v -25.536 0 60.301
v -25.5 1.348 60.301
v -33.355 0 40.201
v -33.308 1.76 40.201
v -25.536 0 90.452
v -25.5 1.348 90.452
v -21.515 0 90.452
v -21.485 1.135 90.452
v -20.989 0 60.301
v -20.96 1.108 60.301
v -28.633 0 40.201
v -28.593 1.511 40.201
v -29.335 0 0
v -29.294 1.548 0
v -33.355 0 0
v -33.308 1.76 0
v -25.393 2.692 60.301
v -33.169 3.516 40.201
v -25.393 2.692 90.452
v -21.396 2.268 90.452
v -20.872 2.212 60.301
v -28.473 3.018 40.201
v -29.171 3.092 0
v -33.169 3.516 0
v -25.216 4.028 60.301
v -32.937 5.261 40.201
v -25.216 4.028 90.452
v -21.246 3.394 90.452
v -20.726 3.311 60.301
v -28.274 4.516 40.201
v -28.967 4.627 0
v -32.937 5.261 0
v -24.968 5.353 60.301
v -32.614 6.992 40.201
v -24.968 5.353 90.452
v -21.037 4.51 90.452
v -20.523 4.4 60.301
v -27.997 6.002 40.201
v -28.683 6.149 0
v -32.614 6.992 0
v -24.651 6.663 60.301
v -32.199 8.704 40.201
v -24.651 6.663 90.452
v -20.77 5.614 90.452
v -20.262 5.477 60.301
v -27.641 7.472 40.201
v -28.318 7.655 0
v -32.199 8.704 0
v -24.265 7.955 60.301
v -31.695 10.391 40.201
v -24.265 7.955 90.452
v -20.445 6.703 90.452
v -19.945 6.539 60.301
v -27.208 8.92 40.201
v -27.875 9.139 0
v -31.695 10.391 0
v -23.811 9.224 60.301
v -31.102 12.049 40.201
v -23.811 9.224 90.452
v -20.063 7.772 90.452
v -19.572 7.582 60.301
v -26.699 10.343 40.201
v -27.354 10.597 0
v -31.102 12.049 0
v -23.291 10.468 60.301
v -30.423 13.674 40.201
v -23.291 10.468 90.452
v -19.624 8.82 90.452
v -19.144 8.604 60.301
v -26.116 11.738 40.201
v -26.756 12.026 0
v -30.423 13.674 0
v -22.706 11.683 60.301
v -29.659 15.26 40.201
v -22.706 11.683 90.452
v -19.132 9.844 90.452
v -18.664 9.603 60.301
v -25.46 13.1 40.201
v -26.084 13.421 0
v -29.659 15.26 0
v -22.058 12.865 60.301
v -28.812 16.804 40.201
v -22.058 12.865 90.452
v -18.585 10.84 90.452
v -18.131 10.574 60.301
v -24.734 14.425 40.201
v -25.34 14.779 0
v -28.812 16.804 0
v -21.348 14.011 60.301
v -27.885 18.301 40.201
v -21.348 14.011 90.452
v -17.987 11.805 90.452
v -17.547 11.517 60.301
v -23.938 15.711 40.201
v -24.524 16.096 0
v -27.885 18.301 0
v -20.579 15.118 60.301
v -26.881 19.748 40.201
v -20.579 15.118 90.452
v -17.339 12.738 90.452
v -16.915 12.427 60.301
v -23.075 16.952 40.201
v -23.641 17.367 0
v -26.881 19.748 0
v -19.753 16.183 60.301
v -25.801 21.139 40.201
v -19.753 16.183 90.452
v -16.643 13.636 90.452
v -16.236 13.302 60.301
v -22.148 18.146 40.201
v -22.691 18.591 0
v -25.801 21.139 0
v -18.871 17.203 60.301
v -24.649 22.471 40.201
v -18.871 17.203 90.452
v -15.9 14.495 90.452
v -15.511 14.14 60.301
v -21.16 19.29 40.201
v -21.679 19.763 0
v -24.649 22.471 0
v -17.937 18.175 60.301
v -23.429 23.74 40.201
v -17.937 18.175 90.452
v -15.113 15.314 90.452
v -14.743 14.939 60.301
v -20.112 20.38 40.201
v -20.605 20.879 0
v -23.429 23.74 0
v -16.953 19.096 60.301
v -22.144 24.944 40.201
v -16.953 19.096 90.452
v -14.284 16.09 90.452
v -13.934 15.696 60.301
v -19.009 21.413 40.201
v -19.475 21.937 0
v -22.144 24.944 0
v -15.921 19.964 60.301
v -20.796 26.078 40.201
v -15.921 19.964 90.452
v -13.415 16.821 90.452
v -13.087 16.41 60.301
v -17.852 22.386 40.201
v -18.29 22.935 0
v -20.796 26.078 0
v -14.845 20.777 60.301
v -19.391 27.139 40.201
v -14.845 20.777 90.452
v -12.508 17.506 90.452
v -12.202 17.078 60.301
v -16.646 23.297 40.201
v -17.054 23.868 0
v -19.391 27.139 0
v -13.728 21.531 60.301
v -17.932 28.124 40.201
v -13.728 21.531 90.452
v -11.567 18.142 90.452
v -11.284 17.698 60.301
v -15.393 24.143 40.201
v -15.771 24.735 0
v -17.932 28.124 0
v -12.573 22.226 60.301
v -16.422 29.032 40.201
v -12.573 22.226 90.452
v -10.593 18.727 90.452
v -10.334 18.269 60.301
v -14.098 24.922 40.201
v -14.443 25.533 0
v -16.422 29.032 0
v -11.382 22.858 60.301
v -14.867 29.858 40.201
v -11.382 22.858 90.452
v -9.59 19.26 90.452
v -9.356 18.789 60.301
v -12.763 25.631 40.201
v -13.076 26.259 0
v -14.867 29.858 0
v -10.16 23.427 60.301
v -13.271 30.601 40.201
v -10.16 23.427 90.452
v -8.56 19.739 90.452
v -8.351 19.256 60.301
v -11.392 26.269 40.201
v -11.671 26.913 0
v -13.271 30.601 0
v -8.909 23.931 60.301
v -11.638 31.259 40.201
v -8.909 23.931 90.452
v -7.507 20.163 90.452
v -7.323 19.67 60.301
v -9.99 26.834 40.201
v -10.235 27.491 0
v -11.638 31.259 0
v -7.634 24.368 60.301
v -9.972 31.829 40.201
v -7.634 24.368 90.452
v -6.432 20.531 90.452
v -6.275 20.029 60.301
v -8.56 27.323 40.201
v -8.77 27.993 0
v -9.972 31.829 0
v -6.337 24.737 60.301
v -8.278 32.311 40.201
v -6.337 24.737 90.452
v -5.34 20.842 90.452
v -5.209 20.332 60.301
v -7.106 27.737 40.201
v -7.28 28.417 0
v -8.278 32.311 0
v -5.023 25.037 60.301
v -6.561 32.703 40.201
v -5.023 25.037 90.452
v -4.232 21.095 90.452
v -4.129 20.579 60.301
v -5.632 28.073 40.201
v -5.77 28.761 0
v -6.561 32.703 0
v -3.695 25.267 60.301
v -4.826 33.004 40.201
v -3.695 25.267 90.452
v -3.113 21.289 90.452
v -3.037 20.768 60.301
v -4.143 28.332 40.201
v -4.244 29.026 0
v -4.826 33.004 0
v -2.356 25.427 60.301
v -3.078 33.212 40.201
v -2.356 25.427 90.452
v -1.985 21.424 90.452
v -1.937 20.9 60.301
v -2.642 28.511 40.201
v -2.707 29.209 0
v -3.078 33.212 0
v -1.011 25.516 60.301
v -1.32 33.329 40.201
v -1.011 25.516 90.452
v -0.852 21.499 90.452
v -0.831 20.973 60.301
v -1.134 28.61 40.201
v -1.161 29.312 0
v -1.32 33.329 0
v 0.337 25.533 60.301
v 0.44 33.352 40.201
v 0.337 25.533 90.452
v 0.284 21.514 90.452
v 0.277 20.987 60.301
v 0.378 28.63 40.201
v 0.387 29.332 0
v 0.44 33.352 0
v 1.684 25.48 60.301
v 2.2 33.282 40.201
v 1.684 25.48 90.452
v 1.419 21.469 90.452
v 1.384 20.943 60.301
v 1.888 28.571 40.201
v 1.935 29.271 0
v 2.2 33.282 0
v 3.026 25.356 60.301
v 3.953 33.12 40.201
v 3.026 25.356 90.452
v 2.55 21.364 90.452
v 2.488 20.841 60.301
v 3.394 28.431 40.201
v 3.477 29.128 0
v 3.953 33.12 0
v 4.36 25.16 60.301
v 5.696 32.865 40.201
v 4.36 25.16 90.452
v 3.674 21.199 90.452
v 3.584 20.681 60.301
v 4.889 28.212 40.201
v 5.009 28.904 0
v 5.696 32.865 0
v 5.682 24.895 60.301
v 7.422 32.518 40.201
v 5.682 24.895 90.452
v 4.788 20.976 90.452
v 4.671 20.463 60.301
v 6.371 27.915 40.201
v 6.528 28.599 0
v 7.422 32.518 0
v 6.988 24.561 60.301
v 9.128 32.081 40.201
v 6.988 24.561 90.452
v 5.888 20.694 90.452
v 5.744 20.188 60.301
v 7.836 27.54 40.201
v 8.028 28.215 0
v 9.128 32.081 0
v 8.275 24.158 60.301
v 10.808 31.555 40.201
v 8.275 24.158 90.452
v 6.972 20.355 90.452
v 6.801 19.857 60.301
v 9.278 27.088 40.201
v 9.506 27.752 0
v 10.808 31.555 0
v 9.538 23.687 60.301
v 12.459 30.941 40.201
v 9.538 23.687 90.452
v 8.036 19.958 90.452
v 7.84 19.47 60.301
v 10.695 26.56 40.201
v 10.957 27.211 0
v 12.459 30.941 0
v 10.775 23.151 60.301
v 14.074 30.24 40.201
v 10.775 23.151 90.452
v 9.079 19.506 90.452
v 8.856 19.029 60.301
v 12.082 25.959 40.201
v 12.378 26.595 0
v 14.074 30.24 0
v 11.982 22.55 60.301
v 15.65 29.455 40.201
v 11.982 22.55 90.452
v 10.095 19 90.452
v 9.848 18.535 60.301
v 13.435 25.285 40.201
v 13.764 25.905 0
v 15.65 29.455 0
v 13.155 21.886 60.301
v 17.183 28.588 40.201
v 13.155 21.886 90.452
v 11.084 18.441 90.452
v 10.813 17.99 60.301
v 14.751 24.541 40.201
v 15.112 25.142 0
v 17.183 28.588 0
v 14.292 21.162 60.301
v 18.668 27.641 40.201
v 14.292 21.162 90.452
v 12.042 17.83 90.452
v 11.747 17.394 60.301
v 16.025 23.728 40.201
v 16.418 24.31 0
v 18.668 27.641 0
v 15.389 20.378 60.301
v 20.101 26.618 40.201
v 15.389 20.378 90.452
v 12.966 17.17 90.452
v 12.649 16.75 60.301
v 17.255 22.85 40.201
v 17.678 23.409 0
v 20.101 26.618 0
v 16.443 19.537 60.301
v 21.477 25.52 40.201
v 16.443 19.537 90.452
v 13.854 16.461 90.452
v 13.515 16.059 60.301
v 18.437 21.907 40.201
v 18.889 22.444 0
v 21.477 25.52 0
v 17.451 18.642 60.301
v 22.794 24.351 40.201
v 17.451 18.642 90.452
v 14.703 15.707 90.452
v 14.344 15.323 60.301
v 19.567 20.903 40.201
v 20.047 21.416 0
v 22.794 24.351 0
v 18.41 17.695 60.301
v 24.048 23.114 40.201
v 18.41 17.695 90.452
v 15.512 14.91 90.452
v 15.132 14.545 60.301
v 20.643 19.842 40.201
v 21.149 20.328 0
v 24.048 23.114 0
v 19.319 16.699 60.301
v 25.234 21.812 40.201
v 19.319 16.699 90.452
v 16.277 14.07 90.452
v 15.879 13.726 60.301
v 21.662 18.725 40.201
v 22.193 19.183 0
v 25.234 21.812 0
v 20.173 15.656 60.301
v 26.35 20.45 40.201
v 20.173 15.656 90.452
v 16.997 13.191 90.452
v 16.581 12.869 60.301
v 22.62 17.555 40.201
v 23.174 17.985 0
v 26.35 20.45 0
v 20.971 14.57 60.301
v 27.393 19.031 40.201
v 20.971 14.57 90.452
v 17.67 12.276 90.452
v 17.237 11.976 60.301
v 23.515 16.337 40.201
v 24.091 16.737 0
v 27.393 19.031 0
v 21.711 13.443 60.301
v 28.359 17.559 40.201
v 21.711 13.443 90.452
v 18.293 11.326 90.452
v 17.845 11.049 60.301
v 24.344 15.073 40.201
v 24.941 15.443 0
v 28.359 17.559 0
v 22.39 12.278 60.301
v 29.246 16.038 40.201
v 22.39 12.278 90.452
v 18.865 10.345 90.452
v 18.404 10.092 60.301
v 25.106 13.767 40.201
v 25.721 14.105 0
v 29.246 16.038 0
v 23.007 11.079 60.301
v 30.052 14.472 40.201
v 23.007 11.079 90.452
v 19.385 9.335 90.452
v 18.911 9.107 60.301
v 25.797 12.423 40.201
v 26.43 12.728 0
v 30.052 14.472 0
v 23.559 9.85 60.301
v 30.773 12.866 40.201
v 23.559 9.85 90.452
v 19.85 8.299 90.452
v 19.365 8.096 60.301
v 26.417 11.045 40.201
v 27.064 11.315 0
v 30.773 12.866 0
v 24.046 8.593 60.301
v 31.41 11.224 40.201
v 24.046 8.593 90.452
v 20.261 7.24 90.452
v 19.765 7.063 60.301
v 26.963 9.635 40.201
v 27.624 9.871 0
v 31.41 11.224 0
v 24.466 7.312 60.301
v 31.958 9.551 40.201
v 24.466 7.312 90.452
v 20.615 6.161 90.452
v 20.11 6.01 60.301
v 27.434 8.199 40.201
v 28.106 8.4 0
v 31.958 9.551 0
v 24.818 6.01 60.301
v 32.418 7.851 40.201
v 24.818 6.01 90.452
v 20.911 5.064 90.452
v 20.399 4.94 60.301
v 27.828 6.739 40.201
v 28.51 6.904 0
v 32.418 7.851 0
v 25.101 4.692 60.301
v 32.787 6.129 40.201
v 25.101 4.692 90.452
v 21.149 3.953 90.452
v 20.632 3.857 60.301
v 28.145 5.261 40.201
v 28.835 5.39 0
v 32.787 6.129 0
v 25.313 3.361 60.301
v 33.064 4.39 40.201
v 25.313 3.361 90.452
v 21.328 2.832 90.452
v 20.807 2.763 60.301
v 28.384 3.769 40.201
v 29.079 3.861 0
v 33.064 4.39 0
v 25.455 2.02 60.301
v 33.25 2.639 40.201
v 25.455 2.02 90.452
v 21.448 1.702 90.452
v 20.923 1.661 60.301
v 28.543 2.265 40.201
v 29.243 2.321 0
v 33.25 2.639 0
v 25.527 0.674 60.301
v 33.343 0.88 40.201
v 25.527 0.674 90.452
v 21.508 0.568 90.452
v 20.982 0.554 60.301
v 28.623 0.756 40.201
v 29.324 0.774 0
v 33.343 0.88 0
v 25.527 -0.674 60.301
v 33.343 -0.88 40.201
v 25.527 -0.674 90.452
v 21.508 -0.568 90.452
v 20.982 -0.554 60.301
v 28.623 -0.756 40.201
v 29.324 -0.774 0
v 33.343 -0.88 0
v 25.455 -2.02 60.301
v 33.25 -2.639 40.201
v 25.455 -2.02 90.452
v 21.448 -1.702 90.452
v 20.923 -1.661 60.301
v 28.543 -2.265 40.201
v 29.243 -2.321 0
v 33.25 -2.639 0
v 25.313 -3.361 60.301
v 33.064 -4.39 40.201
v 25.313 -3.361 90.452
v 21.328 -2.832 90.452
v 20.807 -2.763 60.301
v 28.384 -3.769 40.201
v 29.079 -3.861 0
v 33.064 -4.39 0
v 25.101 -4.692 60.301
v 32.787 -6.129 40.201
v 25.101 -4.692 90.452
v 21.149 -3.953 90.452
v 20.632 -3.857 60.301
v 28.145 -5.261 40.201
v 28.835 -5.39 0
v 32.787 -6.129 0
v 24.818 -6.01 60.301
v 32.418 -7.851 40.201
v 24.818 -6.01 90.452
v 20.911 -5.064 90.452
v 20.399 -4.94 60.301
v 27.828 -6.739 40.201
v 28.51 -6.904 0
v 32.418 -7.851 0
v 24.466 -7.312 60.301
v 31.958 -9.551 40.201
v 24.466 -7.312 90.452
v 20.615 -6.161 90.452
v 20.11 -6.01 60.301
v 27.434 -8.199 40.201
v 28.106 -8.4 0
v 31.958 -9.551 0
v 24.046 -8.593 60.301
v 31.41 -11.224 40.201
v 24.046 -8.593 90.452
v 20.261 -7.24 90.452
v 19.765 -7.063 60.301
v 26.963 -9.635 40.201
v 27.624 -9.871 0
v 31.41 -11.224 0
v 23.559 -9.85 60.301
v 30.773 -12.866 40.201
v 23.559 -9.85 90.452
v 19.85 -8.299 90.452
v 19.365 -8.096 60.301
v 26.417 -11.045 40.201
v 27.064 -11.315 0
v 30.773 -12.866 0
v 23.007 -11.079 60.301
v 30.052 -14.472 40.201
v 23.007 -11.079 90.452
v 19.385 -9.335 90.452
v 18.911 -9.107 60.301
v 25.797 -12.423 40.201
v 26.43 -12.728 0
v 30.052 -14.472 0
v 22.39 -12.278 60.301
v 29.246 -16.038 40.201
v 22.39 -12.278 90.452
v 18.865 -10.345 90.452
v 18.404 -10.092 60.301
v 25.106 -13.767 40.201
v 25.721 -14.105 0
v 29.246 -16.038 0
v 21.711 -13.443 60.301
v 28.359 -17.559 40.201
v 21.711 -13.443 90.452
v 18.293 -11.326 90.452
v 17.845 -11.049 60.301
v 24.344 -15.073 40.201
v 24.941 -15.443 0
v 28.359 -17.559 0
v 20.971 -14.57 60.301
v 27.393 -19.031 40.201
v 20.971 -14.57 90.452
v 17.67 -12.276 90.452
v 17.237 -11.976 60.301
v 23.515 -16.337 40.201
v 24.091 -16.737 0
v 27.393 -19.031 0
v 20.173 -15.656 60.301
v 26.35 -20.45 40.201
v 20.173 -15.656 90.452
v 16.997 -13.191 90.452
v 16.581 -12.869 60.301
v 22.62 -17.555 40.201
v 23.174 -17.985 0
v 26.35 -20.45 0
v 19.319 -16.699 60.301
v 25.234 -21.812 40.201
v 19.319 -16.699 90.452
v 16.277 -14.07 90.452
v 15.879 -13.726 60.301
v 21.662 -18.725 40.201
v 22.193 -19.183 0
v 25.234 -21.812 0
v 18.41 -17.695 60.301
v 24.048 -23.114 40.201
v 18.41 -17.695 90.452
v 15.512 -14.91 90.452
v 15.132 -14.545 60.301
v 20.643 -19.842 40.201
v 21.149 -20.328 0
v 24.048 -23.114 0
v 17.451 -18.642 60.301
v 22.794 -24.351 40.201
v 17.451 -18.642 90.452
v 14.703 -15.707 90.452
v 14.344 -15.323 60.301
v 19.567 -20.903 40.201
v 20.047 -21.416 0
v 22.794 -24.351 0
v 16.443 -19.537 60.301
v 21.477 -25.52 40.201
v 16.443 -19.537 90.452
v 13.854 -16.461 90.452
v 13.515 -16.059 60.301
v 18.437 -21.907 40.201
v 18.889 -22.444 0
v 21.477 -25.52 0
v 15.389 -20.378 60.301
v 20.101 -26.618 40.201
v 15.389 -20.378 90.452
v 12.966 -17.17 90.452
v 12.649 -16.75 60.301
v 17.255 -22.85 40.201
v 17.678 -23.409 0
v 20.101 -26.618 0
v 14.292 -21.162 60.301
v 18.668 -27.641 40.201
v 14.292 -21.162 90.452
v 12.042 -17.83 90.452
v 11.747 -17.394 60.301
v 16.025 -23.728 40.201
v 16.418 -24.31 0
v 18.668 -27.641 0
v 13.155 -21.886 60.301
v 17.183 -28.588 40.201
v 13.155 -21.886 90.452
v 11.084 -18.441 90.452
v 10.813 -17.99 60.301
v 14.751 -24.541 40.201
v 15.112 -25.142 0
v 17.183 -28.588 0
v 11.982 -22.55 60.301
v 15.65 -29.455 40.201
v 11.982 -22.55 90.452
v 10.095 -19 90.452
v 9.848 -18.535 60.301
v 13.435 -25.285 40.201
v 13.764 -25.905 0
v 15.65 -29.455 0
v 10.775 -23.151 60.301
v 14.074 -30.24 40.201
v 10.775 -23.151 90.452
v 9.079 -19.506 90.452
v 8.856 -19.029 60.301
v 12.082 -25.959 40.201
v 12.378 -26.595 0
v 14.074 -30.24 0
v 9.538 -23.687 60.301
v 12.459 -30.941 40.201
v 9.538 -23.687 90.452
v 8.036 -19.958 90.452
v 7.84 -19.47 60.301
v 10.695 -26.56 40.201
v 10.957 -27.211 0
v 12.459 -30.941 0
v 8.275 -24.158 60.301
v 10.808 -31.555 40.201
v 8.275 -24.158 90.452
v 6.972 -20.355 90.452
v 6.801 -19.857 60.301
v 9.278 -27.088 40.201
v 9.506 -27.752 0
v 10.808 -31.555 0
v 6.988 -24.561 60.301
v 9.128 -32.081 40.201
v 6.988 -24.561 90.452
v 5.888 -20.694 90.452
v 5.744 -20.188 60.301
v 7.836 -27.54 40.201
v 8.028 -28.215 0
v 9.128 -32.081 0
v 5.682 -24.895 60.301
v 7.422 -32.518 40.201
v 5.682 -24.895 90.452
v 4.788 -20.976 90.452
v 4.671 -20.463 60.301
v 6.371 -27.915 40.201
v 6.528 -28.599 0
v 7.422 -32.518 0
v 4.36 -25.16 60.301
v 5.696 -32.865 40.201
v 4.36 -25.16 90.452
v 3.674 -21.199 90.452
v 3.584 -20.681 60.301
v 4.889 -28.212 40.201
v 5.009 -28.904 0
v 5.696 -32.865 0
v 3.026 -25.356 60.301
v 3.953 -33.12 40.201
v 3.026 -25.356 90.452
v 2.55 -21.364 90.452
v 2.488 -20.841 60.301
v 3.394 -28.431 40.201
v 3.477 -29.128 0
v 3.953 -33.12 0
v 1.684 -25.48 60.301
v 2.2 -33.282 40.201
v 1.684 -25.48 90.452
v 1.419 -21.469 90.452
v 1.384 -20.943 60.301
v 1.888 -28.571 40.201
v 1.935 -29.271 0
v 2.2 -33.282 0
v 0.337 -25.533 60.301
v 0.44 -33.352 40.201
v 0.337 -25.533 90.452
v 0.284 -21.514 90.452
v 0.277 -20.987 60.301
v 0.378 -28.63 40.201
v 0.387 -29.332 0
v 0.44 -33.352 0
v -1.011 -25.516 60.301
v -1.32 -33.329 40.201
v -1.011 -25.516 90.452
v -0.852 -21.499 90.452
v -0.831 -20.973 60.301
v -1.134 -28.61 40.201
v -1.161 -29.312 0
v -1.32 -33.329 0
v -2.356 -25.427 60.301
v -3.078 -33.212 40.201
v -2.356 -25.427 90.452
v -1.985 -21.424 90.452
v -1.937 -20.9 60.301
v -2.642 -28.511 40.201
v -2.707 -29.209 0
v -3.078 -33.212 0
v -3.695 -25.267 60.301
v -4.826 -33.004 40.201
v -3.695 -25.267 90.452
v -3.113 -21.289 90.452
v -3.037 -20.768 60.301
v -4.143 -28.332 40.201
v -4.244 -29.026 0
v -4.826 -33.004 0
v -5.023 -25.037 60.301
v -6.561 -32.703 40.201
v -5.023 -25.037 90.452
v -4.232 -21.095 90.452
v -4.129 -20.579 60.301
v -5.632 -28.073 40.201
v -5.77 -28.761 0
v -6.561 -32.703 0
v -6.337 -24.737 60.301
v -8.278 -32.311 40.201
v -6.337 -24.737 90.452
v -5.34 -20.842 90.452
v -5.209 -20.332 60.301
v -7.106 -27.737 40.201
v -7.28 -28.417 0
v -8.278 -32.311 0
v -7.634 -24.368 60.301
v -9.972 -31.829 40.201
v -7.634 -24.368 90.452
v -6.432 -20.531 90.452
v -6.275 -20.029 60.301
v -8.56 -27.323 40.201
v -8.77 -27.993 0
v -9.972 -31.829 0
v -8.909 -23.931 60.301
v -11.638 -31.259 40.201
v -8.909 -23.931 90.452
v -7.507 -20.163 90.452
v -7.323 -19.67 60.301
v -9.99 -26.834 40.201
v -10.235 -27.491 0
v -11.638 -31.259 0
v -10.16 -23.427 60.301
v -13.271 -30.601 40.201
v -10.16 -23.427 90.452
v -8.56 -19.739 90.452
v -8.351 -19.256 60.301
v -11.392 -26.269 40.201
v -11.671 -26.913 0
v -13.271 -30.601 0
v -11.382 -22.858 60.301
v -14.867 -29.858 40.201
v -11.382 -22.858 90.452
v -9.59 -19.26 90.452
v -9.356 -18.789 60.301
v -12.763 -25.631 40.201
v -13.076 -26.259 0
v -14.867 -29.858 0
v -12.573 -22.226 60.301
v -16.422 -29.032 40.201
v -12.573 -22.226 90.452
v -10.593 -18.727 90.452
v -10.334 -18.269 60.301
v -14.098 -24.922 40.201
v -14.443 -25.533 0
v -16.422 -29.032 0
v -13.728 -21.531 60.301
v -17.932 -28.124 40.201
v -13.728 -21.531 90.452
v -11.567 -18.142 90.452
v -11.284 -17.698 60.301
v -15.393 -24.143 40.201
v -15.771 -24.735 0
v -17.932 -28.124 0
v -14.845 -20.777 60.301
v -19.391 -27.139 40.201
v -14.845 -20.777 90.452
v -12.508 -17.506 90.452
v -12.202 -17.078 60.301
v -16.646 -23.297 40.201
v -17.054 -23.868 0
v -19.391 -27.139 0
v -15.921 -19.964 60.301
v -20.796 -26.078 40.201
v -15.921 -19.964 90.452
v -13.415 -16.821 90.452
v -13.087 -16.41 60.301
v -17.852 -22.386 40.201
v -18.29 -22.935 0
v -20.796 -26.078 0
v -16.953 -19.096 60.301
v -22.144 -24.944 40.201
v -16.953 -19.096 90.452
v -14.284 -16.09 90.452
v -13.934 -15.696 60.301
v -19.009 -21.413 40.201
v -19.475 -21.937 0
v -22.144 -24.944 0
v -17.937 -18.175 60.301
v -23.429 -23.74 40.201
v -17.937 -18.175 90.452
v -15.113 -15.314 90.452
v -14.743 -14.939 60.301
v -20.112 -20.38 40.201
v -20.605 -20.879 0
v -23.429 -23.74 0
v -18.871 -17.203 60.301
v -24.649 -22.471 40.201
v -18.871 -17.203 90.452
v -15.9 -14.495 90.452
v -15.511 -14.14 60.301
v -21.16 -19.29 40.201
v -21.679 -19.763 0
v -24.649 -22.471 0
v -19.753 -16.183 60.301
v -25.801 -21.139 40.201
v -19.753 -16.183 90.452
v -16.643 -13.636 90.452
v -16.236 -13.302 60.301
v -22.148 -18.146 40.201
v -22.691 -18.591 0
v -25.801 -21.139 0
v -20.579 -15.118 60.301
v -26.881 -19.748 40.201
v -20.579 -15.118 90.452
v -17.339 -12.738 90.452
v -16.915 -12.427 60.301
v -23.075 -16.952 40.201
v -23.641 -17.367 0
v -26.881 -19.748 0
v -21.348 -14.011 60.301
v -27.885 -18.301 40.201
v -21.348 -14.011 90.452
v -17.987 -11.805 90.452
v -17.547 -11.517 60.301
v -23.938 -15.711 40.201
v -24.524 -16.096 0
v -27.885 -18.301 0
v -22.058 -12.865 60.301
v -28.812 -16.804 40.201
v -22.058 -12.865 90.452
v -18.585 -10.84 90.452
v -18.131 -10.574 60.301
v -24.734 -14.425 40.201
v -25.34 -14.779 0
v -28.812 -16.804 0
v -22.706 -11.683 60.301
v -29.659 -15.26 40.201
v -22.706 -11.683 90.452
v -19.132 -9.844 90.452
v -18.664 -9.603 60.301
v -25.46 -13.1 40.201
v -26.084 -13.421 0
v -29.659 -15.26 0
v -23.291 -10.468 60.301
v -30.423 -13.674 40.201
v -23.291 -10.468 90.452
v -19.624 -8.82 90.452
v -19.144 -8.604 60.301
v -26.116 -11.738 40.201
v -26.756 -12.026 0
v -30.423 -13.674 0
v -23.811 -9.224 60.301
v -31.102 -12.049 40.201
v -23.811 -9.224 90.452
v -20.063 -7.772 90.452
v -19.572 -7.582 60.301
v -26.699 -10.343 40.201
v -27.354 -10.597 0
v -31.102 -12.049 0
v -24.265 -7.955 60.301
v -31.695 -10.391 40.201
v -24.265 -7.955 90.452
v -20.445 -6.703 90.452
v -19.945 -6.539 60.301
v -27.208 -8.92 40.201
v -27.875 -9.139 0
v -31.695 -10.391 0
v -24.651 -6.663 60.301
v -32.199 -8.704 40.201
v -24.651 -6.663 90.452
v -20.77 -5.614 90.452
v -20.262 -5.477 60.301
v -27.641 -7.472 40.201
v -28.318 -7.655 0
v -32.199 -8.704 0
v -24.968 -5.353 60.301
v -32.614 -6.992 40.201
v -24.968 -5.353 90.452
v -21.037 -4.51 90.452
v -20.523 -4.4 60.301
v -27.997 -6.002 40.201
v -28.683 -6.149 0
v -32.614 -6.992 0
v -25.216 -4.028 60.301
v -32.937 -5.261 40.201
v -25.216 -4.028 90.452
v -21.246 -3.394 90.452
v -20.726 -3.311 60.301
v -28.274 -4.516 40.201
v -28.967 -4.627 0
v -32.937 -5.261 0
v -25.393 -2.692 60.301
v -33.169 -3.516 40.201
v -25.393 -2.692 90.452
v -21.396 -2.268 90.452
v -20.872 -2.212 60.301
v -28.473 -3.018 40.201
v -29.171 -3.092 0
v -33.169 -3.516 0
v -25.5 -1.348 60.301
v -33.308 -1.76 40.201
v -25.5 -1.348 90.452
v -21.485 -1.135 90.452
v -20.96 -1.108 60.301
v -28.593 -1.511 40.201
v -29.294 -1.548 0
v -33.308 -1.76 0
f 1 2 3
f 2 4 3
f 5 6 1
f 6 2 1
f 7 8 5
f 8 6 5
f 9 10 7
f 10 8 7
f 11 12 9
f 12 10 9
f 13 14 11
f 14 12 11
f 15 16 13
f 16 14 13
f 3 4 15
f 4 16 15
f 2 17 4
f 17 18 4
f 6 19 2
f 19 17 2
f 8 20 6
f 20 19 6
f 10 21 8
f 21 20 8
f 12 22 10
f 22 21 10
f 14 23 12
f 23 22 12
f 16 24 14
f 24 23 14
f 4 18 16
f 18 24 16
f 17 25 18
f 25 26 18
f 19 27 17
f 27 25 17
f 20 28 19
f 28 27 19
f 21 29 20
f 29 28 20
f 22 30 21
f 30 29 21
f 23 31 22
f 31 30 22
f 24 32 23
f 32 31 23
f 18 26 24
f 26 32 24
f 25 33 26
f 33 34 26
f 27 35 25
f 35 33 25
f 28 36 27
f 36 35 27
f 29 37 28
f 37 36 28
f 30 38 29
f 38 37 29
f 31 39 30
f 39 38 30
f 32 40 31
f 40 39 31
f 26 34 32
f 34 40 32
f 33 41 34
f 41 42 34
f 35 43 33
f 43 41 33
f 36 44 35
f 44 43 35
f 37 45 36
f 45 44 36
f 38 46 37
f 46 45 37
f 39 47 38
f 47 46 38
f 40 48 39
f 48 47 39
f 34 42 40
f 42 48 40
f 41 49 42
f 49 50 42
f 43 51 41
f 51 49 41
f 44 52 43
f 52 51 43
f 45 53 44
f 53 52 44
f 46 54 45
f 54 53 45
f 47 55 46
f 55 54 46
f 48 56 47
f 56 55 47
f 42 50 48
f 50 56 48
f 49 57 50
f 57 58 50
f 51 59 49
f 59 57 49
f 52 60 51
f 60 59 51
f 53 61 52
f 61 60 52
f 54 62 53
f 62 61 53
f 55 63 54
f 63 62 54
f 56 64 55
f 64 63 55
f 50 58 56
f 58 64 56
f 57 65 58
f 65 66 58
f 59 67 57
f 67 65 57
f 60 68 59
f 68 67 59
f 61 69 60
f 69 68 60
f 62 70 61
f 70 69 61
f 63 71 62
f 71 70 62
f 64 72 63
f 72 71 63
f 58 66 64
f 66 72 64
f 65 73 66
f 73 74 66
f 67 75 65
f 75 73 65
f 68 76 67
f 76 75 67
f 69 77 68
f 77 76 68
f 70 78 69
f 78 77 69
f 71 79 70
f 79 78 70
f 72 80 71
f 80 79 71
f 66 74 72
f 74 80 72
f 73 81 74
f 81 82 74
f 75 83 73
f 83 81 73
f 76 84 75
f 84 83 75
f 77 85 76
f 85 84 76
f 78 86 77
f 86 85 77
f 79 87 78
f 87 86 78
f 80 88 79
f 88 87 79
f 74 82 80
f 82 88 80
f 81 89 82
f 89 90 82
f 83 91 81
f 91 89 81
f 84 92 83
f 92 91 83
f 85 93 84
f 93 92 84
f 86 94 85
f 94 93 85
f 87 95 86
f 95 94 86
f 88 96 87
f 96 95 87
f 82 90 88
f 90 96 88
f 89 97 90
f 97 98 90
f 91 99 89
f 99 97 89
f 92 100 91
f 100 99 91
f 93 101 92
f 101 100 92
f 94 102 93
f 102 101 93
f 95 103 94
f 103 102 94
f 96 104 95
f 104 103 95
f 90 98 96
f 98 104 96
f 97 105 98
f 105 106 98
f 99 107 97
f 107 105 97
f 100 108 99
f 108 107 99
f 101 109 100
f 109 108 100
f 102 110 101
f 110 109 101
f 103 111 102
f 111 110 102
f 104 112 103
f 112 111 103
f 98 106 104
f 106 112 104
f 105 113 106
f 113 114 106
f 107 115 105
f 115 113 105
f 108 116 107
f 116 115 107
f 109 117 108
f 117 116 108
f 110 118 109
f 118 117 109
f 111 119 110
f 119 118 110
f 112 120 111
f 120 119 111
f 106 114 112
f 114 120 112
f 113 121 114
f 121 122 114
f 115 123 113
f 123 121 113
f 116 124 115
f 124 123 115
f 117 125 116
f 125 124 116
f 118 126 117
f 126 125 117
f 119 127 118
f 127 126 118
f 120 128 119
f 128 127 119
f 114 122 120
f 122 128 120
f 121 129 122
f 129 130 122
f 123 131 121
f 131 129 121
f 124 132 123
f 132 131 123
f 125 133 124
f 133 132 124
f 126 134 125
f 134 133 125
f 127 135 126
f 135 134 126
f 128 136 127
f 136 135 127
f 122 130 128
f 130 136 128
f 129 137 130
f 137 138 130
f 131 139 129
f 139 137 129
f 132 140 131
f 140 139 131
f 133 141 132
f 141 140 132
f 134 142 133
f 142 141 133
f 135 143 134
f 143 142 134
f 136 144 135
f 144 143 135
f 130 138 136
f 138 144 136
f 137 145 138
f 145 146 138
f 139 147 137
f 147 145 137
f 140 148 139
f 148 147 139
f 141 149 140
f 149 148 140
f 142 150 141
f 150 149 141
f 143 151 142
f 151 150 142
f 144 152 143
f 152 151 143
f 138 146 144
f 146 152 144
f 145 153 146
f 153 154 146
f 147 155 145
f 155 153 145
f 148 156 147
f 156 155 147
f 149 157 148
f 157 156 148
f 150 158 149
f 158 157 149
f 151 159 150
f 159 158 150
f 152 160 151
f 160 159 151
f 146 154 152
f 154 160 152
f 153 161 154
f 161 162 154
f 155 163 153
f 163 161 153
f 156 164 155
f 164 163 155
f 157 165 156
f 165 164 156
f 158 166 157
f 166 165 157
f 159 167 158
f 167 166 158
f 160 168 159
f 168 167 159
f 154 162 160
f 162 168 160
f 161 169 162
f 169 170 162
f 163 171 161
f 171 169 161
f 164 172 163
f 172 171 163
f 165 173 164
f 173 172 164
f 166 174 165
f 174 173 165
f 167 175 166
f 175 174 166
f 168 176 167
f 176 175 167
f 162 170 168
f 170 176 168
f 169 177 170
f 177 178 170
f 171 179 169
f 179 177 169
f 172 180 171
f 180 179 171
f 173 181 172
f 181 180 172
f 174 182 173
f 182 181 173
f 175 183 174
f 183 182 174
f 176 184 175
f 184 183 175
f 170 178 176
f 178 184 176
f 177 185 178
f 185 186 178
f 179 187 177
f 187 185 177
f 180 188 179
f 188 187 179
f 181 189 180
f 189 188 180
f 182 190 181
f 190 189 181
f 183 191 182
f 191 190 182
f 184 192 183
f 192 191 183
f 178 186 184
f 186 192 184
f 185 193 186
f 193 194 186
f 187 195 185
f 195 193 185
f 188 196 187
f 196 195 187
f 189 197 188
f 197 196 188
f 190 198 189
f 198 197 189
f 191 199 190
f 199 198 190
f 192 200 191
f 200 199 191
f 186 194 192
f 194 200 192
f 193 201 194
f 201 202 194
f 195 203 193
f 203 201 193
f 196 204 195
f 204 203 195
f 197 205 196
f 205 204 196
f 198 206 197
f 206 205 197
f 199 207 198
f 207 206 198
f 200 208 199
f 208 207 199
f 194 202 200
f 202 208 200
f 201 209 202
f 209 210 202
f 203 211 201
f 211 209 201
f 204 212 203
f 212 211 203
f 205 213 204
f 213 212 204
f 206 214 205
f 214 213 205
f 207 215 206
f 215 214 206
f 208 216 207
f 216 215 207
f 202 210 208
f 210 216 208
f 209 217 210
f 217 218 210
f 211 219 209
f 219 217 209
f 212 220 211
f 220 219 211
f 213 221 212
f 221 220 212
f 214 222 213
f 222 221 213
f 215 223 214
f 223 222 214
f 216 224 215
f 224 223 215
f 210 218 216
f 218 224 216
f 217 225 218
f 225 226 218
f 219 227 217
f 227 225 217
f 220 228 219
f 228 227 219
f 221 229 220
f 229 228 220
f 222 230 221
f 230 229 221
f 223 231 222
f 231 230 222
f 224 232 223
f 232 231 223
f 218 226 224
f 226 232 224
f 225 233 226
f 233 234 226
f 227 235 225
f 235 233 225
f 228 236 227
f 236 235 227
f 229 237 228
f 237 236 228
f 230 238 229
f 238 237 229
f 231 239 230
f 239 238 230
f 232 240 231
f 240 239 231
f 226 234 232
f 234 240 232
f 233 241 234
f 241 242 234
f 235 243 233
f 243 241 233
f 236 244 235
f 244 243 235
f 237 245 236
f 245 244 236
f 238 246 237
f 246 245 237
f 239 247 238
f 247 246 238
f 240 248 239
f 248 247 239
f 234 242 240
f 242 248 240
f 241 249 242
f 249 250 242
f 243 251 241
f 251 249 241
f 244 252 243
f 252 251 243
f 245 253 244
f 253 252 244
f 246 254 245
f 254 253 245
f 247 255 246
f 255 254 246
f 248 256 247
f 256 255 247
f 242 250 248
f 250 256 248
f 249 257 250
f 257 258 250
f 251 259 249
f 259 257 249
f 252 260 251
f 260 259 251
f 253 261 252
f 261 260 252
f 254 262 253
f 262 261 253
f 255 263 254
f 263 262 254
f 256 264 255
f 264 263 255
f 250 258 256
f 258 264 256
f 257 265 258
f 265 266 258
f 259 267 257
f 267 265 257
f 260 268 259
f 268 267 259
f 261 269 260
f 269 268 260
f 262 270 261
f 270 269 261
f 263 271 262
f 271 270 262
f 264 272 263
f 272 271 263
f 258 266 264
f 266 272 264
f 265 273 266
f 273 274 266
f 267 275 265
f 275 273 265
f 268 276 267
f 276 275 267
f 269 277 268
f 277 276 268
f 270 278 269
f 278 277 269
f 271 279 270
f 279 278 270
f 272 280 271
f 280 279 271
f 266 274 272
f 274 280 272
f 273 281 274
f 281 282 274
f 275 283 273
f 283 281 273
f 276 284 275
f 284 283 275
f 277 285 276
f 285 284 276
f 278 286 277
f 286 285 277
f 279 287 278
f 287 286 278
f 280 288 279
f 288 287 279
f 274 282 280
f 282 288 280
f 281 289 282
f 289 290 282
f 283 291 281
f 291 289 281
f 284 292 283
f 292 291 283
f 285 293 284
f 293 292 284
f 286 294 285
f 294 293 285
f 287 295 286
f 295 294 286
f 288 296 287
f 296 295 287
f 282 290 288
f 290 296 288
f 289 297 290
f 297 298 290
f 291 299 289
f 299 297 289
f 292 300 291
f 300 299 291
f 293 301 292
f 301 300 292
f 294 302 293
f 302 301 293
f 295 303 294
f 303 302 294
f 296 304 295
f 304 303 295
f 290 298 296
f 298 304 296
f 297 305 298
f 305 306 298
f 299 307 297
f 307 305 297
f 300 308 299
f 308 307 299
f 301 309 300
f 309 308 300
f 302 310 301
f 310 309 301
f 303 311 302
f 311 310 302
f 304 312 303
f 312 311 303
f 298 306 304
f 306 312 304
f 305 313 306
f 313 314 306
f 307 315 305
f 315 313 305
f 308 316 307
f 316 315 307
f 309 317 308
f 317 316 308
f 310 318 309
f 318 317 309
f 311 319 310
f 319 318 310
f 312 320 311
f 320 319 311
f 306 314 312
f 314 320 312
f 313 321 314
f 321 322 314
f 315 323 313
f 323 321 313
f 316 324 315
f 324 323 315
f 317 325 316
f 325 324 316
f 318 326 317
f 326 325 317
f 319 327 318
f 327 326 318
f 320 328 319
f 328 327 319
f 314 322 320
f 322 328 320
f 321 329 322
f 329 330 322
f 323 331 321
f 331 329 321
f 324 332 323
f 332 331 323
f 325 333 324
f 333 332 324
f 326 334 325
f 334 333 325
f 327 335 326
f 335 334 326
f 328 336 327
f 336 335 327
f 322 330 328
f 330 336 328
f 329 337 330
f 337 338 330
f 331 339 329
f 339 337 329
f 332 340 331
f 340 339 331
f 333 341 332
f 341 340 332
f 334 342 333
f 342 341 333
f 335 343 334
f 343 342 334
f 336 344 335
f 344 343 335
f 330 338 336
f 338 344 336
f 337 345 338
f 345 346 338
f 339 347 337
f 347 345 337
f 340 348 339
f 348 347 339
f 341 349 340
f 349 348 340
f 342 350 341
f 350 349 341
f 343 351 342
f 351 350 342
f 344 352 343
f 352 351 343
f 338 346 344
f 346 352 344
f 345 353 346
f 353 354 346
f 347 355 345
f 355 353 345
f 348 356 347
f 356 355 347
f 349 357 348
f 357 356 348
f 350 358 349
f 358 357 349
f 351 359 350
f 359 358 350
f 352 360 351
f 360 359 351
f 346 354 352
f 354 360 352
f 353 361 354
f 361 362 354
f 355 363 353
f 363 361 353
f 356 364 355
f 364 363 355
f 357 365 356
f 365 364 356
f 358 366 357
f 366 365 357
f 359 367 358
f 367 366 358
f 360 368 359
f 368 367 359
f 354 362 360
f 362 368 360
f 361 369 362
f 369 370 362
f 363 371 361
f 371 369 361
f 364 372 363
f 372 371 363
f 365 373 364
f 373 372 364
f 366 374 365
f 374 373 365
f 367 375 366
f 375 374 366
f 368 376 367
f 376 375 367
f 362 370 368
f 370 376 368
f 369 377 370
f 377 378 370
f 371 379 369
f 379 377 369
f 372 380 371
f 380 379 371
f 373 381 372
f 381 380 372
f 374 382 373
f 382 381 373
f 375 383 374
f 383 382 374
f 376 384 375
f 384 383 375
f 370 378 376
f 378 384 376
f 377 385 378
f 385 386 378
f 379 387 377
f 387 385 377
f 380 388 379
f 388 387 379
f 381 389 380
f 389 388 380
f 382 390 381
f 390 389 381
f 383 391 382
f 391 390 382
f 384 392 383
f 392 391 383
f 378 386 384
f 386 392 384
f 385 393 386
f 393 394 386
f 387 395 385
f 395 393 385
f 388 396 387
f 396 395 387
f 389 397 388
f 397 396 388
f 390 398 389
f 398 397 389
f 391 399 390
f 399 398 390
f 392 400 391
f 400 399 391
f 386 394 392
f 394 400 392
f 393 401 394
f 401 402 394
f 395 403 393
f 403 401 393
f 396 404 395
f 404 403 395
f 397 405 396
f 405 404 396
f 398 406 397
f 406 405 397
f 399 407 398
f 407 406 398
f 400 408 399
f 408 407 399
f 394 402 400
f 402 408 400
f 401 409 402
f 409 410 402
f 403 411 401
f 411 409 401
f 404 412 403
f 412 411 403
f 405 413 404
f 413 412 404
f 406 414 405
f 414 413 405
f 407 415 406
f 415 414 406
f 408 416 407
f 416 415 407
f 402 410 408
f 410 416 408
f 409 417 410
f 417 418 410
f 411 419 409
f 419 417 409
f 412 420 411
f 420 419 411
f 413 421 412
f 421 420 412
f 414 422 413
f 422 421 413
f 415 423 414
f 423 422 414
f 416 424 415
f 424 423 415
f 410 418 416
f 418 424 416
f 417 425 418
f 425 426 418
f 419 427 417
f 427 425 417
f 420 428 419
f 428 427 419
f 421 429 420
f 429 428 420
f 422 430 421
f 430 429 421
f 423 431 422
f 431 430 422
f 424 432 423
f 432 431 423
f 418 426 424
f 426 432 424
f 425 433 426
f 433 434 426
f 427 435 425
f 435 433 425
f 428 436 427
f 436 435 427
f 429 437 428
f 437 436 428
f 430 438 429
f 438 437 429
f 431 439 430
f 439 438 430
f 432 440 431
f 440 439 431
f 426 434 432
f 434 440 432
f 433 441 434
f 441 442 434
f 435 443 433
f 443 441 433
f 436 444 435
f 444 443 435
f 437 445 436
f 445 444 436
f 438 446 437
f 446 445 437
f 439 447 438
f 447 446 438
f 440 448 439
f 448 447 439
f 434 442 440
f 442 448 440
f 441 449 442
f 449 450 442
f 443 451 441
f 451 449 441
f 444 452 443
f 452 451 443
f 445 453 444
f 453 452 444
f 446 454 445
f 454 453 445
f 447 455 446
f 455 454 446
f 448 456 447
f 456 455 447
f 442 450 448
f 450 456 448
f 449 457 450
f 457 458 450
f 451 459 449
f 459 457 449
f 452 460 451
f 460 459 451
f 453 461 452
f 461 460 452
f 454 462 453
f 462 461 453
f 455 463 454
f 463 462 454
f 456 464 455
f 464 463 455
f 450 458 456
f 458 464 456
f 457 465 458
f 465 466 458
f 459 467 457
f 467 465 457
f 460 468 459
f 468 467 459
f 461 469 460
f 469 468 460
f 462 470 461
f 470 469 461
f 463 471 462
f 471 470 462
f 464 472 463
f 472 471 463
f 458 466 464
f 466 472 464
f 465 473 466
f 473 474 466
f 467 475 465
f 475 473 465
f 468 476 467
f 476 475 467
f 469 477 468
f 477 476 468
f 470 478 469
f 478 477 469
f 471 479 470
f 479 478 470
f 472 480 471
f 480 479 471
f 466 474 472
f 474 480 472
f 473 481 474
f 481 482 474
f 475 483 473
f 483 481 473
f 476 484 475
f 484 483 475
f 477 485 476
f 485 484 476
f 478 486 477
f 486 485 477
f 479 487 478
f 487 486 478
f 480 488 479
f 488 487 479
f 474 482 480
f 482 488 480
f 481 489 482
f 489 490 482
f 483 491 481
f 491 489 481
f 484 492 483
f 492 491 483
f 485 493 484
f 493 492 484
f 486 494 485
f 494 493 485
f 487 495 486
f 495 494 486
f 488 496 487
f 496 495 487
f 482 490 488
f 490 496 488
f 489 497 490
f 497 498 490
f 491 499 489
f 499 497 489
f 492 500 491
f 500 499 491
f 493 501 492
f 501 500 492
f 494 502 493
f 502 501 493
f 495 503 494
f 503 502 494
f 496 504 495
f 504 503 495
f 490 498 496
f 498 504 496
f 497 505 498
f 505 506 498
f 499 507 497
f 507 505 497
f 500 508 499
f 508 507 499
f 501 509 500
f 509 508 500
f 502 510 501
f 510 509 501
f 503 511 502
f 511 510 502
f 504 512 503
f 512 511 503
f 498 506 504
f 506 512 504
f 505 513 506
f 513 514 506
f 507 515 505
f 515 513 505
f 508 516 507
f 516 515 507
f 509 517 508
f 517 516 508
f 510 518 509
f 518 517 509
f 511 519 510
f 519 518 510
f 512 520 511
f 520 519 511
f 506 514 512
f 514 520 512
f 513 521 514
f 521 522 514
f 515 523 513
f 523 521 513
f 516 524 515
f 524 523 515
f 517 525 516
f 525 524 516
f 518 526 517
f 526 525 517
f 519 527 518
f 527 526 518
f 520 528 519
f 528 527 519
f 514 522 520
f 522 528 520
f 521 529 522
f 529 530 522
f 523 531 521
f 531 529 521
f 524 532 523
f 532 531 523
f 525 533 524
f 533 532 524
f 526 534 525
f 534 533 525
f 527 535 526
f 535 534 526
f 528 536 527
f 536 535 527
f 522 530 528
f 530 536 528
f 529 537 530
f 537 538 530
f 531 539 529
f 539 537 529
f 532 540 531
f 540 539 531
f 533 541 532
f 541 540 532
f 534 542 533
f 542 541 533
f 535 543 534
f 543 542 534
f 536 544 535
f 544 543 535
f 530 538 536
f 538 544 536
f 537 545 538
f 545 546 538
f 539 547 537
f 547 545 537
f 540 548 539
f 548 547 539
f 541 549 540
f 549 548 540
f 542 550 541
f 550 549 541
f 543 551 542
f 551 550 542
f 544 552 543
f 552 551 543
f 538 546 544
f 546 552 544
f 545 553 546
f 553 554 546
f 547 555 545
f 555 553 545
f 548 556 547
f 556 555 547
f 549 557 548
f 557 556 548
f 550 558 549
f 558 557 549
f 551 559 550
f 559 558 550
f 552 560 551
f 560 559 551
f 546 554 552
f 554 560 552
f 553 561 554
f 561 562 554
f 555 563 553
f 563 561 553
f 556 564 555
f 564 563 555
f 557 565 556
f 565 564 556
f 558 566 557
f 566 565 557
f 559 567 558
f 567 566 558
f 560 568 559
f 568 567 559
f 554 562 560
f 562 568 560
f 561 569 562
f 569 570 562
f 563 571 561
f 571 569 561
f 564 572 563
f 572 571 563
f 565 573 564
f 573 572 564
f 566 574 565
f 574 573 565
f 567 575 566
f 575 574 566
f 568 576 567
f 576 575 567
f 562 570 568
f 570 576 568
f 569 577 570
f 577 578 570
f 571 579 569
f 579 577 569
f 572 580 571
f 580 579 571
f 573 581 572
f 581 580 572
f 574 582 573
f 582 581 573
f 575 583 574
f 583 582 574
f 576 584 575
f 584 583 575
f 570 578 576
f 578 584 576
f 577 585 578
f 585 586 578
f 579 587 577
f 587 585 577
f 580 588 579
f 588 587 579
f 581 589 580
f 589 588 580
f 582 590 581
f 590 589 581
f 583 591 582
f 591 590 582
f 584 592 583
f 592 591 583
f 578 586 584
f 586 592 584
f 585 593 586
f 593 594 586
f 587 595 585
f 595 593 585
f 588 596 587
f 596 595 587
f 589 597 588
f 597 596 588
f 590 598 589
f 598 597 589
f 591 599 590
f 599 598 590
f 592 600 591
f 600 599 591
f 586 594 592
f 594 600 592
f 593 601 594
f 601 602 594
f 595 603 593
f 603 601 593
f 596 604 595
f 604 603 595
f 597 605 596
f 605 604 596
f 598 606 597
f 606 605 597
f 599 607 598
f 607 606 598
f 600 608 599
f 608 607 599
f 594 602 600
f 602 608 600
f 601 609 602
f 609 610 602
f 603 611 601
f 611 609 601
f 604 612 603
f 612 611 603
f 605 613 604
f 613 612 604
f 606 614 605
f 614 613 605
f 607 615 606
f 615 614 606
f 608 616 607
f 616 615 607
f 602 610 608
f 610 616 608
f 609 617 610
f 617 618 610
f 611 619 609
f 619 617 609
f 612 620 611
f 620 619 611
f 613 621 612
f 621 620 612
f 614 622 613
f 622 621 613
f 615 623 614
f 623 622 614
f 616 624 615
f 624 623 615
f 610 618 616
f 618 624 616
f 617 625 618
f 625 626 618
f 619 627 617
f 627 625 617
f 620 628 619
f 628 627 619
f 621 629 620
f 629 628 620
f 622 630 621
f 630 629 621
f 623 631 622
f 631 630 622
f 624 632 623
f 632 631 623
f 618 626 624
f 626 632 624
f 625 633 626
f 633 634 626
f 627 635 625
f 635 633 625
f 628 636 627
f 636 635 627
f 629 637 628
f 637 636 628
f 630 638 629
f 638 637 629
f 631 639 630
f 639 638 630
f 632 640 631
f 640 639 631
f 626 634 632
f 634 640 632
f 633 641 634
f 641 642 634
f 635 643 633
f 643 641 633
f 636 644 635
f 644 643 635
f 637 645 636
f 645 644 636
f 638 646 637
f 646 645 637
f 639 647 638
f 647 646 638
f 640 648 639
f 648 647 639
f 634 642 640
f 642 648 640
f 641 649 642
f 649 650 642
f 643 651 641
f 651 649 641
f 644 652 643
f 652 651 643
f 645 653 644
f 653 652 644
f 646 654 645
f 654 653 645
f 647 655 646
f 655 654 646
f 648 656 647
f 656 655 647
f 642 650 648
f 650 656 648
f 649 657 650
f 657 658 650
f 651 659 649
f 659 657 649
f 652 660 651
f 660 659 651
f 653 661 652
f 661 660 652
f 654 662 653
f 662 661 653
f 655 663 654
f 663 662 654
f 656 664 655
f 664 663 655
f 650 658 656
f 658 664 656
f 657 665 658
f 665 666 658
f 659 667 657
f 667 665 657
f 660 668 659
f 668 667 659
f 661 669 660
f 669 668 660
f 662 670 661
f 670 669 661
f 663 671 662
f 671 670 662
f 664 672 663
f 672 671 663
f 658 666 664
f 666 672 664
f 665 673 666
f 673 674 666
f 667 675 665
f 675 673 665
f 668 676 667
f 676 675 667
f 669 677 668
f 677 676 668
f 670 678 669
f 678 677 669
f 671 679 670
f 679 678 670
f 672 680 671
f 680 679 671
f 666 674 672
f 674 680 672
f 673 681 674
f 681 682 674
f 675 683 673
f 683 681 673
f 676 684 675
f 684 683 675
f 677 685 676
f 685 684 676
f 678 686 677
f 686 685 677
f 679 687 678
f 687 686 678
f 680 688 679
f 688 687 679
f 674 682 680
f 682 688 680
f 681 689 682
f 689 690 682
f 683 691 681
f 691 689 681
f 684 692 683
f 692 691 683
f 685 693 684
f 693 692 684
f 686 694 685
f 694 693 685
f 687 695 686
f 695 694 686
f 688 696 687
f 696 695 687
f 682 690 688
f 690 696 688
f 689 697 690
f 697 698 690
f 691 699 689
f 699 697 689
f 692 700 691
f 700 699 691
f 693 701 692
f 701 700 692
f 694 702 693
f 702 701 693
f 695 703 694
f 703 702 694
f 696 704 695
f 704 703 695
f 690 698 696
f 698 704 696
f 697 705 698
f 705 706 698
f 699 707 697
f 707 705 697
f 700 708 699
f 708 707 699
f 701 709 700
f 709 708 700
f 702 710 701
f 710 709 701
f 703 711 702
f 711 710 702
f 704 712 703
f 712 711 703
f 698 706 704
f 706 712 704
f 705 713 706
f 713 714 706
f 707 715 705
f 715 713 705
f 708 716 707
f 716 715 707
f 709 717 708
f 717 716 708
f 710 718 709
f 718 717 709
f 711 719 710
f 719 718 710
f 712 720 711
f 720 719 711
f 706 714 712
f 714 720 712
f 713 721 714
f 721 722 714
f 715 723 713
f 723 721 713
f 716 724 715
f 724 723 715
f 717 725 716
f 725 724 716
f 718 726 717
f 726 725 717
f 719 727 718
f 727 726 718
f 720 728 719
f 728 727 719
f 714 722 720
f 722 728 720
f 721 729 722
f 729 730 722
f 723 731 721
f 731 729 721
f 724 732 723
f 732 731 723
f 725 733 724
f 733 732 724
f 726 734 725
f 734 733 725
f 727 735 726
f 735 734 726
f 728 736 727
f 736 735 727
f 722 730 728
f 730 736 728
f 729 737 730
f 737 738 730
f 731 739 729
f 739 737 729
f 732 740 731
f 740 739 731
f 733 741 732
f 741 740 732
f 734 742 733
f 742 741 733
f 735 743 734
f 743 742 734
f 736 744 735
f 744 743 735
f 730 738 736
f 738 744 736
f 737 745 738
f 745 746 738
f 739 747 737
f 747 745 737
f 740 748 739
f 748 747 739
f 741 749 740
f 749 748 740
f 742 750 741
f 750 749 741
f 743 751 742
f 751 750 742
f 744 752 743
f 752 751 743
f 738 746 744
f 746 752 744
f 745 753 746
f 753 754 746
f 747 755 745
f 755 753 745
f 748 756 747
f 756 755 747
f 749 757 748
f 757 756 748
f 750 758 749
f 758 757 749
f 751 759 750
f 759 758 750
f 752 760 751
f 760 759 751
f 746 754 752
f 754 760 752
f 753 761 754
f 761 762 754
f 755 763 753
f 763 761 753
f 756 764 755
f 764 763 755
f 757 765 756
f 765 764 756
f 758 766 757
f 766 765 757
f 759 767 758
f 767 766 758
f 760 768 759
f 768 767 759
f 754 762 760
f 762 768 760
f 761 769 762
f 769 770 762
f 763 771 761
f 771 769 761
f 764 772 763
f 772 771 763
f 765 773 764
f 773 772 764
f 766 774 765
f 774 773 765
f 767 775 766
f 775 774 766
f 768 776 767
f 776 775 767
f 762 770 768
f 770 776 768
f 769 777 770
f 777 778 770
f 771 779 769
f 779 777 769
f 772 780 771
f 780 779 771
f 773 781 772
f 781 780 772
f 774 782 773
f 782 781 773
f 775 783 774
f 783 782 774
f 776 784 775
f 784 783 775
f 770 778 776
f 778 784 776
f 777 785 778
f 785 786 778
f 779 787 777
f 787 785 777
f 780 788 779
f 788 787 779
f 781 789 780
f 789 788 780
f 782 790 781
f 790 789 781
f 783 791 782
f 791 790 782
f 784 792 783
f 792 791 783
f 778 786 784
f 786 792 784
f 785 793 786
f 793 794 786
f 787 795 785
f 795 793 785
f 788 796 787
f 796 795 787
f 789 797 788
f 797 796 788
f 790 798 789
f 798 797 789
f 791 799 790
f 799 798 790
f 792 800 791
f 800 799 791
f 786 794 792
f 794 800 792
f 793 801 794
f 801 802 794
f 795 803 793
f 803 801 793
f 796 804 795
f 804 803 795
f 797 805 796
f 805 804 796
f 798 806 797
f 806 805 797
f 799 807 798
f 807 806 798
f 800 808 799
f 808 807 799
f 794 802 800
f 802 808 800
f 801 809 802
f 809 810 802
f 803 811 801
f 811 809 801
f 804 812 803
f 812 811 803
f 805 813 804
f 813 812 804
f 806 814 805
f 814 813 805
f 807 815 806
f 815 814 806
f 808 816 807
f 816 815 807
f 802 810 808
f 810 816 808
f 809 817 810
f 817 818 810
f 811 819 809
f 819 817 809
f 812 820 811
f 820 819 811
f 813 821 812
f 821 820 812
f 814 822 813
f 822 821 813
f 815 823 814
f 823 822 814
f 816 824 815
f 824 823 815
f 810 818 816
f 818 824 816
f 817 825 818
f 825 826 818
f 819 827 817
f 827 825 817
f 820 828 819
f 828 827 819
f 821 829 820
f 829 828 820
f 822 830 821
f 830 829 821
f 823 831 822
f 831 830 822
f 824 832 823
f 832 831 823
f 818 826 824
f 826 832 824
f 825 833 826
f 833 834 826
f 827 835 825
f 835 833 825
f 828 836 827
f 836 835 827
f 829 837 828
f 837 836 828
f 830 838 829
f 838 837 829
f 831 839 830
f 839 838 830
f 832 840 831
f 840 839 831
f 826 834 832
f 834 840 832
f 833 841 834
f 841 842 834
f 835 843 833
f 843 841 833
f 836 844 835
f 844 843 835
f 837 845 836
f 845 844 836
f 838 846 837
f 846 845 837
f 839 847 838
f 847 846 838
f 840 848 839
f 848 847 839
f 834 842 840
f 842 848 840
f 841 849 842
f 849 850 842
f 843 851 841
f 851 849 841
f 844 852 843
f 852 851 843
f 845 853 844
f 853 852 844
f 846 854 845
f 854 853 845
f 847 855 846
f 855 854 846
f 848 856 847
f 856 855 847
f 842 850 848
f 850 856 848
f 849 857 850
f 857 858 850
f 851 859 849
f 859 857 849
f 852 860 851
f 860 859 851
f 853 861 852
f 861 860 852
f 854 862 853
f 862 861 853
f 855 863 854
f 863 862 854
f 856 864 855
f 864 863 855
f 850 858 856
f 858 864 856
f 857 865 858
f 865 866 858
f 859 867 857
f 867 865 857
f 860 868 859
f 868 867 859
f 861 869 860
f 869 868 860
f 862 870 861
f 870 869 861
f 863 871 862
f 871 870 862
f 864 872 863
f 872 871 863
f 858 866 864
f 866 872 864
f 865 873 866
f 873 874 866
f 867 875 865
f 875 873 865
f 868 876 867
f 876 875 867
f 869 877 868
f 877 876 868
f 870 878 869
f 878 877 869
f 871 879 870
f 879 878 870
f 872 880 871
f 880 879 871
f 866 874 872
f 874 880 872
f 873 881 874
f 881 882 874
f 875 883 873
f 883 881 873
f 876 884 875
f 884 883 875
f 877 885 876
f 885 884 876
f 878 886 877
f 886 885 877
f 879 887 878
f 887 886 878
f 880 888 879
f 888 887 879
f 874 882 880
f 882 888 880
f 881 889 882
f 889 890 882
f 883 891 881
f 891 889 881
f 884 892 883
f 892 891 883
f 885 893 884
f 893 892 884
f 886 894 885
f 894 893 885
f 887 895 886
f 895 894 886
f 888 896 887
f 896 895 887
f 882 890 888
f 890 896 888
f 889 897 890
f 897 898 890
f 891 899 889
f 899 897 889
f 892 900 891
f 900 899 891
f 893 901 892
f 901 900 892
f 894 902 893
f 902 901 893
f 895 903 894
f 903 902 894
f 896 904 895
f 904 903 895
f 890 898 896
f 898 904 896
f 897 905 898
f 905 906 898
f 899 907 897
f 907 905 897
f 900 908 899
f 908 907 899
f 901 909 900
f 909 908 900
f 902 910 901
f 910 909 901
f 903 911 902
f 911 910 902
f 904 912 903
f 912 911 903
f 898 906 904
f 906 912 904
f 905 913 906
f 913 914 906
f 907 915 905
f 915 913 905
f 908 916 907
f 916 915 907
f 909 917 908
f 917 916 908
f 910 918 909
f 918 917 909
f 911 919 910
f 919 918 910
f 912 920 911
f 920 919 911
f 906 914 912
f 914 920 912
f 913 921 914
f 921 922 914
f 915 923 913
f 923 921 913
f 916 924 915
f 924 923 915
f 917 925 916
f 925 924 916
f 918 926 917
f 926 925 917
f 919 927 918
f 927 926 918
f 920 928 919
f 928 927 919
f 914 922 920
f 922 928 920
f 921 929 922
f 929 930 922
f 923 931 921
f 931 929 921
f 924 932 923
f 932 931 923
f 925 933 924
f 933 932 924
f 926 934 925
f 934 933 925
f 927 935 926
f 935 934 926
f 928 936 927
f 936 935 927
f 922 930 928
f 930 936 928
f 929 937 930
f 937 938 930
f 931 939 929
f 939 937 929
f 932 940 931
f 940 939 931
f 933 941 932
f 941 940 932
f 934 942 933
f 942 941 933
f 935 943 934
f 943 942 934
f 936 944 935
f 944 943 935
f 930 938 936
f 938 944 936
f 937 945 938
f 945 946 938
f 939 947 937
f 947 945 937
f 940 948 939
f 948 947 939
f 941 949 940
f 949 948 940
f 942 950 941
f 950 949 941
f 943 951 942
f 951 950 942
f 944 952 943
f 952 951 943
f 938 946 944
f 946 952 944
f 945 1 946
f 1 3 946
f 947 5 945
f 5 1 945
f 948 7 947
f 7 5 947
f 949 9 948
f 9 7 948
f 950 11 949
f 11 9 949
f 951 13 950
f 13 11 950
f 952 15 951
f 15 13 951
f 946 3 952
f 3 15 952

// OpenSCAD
//------------------------------------------------------------------
/*

Adapters for connecting a tool to a dust collector.

The adapter fits around the outside diameter of the pipes on the
tool and the vaccuum. Measure the diameter of the pipes with a set
of calipers. Enter the values and the script will take care of
the rest.

*/
//------------------------------------------------------------------
// Parameters:

// outside diameter of pipe 1 (mm)
od_pipe_1 = 57.4;
// adapter length for pipe 1 (mm)
len_pipe_1 = 40;
// outside diameter of pipe 1 (mm)
od_pipe_2 = 42.1;
// adapter length for pipe 2 (mm)
len_pipe_2 = 30;
// transition length (mm)
transition_length = 20;
// wall thickness (mm)
wall_thickness = 4;
// The adapter ID will be larger than the pipe OD by this factor
clearance = 1.017;
// internal taper (degrees)
taper = 1;

//------------------------------------------------------------------
// Set the scaling value to compensate for print shrinkage

scale = 1/0.995; // ABS ~0.5% shrinkage
//scale = 1/0.998; // PLA ~0.2% shrinkage

function dim(x) = scale * x;

//------------------------------------------------------------------
// derived values

r1 = dim(od_pipe_1) / 2;
r2 = dim(od_pipe_2) / 2;

len1 = dim(len_pipe_1);
len2 = dim(len_pipe_2);

tlen = dim(transition_length);

wt = dim(wall_thickness);

//------------------------------------------------------------------
// control the number of facets on cylinders

facet_epsilon = 0.01;
function facets(r) = 180 / acos(1 - (facet_epsilon / r));

//------------------------------------------------------------------
// generate a 2D polygon for the adapter wall

module adapter_wall() {

  ir1 = r1 * clearance;
  ir2 = r2 * clearance;
  or1 = ir1 + wt;
  or2 = ir2 + wt;
  t1 = len1 * tan(taper);
  t2 = len2 * tan(taper);

  echo("nominal od1 is ", or1 * 2, "mm");
  echo("nominal od2 is ", or2 * 2, "mm");

  points = [
    [ir1, 0],
    [or1, 0],
    [or1, len1],
    [or2, len1 + tlen],
    [or2, len1 + tlen + len2],
    [ir2, len1 + tlen + len2],
    [ir2 - t2, len1 + tlen],
    [ir1 - t1, len1],
  ];
  polygon(points=points, convexity = 2);
}

//------------------------------------------------------------------

module adapter() {
  overhang_angle = atan2(abs(r2 - r1), transition_length);
  echo("overhang angle is ", overhang_angle, "degrees");
  rotate_extrude(angle = 360, $fn = facets(r1)) {
    adapter_wall();
  }
}

adapter();

//------------------------------------------------------------------
